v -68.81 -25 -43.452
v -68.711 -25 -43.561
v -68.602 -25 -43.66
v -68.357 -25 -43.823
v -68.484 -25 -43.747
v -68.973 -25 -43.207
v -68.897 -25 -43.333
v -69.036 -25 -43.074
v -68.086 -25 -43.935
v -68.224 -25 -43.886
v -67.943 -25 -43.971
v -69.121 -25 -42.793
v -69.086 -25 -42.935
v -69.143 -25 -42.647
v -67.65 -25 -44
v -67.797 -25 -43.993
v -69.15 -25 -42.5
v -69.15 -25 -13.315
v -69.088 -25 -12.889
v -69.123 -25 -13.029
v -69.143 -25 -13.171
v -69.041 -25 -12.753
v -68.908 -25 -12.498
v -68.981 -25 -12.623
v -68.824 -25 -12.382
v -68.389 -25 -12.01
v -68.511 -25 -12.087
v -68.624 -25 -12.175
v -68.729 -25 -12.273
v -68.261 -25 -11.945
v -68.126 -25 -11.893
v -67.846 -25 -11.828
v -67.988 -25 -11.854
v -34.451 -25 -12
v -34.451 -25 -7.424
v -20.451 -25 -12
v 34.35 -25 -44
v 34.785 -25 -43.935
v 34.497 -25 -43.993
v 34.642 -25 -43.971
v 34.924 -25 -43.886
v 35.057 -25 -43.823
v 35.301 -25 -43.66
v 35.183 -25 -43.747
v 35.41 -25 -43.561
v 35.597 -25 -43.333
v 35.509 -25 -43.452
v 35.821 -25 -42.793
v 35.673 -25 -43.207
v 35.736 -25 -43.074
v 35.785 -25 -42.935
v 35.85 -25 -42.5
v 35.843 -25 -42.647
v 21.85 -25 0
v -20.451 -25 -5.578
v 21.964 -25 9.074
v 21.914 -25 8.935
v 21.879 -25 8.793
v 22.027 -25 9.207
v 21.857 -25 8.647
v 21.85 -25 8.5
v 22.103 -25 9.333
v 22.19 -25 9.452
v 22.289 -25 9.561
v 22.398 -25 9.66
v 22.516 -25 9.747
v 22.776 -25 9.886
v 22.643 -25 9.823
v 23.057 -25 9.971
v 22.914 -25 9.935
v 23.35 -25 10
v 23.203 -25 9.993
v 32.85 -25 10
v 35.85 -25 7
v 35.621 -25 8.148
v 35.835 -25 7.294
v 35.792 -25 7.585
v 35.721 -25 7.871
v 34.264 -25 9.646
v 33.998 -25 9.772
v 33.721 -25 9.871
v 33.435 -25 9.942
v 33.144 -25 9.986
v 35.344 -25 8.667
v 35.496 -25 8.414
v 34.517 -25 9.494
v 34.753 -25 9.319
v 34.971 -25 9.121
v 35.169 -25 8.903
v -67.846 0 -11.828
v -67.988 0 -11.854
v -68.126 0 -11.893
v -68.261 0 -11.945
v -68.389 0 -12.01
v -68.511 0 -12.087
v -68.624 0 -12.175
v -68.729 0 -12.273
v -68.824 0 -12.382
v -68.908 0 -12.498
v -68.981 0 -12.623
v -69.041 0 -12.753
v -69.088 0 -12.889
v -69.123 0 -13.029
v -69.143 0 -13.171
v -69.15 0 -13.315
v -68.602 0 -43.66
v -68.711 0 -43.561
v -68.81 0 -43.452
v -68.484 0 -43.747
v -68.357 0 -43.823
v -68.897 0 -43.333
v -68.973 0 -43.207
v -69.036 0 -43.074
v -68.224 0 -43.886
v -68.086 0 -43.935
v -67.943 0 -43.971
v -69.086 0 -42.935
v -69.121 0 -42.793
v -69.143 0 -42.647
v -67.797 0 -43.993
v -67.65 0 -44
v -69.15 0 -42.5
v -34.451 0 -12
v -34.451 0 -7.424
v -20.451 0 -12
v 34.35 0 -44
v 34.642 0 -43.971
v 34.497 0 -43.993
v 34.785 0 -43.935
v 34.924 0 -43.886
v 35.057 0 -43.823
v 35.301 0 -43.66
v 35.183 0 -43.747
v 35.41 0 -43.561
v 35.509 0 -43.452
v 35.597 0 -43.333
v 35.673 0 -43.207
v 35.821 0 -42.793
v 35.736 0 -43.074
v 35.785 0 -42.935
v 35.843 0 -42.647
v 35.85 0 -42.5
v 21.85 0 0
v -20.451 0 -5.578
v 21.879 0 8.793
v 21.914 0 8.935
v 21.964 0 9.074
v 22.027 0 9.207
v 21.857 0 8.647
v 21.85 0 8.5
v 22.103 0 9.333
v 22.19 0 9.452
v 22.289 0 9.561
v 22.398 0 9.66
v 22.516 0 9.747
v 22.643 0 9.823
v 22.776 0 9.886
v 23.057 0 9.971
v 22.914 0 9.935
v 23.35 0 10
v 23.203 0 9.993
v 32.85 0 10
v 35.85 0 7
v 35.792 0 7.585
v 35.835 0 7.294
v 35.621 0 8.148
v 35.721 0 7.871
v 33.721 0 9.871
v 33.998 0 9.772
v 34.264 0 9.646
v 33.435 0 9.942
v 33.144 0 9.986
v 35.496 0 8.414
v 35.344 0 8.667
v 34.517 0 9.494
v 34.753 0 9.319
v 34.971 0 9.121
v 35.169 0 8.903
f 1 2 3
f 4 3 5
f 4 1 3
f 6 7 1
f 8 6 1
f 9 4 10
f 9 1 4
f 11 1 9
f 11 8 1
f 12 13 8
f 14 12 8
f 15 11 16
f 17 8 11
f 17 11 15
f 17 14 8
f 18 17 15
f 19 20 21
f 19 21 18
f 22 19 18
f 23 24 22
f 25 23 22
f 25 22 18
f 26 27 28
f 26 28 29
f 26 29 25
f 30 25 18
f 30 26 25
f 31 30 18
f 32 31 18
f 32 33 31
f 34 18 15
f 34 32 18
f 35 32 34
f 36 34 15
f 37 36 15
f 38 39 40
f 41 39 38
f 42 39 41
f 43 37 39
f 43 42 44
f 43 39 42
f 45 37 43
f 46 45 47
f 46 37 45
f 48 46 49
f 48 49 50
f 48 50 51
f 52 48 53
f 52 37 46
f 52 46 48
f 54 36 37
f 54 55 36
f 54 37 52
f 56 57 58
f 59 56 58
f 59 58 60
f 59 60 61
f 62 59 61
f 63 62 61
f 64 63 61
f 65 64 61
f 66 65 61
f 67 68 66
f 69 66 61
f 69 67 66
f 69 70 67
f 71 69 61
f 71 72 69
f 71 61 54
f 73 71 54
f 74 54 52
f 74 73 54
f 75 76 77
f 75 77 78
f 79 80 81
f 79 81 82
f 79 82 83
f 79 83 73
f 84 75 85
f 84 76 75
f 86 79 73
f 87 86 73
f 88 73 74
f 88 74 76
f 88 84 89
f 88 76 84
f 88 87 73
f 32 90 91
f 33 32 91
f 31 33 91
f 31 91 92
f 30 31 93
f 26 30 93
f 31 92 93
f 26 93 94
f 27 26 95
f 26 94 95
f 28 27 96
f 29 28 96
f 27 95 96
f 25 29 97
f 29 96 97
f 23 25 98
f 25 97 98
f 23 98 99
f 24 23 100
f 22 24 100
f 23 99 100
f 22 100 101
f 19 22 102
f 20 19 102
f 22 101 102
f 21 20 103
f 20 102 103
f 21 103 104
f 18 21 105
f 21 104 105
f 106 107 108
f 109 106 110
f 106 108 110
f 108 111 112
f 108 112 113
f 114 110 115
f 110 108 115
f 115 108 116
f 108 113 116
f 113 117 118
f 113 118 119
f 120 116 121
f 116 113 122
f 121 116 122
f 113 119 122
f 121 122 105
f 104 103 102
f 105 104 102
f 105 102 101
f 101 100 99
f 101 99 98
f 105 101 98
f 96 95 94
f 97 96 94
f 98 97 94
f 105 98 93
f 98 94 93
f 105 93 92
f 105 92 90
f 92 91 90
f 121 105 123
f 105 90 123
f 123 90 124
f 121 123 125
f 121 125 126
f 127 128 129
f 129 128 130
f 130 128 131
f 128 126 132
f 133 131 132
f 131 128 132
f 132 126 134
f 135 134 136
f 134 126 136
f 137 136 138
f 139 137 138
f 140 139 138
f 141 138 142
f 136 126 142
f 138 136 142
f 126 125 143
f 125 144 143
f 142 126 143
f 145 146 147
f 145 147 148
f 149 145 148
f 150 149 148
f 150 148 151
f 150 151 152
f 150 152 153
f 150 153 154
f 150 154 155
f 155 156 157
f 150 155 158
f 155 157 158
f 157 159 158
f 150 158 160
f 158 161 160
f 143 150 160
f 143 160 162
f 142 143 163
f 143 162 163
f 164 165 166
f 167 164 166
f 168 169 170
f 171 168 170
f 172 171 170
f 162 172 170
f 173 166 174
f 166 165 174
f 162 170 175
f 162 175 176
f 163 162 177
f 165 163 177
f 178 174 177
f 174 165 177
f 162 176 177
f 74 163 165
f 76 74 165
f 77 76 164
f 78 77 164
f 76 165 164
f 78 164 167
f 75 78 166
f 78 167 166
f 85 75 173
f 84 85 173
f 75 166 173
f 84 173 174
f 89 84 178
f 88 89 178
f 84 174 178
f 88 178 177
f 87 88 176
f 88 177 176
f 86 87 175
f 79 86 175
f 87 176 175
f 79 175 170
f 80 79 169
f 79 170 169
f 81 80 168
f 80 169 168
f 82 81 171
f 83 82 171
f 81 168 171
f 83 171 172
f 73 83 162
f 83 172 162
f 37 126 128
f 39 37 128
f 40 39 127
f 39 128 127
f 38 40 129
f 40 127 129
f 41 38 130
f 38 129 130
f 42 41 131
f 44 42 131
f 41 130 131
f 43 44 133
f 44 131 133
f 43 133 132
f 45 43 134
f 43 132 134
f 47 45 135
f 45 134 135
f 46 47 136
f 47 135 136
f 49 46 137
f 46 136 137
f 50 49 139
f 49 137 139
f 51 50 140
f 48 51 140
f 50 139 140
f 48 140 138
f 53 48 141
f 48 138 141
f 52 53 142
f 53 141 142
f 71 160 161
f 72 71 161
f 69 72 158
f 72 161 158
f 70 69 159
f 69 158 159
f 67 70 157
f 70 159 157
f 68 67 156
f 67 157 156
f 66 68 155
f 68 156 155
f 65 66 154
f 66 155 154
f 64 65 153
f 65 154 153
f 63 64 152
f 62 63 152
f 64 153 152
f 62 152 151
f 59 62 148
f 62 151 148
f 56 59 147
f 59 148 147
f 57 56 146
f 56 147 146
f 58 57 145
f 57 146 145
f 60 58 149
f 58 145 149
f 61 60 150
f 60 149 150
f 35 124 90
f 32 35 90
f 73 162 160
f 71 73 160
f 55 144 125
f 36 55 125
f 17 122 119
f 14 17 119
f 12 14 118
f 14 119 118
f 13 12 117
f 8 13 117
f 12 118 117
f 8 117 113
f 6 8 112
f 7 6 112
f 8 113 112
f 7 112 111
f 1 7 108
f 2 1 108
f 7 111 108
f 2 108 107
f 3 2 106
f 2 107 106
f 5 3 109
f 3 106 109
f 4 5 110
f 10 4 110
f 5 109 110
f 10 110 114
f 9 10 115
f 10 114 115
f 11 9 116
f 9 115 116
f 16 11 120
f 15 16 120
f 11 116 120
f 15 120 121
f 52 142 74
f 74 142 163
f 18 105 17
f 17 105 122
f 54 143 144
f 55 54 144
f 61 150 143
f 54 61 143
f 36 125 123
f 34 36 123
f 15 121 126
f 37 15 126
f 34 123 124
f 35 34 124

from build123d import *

# Parameters (mm, degrees)
F1_DEPTH = 25


with BuildPart() as f1:
    # F0 (on Front) → F1 (new body)
    with BuildSketch(Plane.XZ):
        with BuildLine():
            Line((-67.65018, -44), (-34.450579, -44))
            Line((-34.450579, -44), (-34.450579, -12))
            Line((-34.450579, -12), (-34.450579, -7.424228))
            Line((-34.450579, -7.424228), (-67.846284, -11.828058))
            ThreePointArc((-67.846284, -11.828058), (-68.778044, -12.326284), (-69.15018, -13.315183))
            Line((-69.15018, -13.315183), (-69.15018, -42.5))
            ThreePointArc((-69.15018, -42.5), (-68.71084, -43.56066), (-67.65018, -44))
        make_face()
        with BuildLine():
            Line((-34.450579, -44), (34.34982, -44))
            ThreePointArc((34.34982, -44), (35.410481, -43.56066), (35.84982, -42.5))
            Line((35.84982, -42.5), (35.84982, 7))
            ThreePointArc((35.84982, 7), (34.971141, 9.12132), (32.84982, 10))
            Line((32.84982, 10), (23.34982, 10))
            ThreePointArc((23.34982, 10), (22.28916, 9.56066), (21.84982, 8.5))
            Line((21.84982, 8.5), (21.84982, 0))
            Line((21.84982, 0), (-20.450579, -5.578075))
            Line((-20.450579, -5.578075), (-20.450579, -12))
            Line((-20.450579, -12), (-34.450579, -12))
            Line((-34.450579, -12), (-34.450579, -44))
        make_face()
    extrude(amount=F1_DEPTH)


solid = f1.part
